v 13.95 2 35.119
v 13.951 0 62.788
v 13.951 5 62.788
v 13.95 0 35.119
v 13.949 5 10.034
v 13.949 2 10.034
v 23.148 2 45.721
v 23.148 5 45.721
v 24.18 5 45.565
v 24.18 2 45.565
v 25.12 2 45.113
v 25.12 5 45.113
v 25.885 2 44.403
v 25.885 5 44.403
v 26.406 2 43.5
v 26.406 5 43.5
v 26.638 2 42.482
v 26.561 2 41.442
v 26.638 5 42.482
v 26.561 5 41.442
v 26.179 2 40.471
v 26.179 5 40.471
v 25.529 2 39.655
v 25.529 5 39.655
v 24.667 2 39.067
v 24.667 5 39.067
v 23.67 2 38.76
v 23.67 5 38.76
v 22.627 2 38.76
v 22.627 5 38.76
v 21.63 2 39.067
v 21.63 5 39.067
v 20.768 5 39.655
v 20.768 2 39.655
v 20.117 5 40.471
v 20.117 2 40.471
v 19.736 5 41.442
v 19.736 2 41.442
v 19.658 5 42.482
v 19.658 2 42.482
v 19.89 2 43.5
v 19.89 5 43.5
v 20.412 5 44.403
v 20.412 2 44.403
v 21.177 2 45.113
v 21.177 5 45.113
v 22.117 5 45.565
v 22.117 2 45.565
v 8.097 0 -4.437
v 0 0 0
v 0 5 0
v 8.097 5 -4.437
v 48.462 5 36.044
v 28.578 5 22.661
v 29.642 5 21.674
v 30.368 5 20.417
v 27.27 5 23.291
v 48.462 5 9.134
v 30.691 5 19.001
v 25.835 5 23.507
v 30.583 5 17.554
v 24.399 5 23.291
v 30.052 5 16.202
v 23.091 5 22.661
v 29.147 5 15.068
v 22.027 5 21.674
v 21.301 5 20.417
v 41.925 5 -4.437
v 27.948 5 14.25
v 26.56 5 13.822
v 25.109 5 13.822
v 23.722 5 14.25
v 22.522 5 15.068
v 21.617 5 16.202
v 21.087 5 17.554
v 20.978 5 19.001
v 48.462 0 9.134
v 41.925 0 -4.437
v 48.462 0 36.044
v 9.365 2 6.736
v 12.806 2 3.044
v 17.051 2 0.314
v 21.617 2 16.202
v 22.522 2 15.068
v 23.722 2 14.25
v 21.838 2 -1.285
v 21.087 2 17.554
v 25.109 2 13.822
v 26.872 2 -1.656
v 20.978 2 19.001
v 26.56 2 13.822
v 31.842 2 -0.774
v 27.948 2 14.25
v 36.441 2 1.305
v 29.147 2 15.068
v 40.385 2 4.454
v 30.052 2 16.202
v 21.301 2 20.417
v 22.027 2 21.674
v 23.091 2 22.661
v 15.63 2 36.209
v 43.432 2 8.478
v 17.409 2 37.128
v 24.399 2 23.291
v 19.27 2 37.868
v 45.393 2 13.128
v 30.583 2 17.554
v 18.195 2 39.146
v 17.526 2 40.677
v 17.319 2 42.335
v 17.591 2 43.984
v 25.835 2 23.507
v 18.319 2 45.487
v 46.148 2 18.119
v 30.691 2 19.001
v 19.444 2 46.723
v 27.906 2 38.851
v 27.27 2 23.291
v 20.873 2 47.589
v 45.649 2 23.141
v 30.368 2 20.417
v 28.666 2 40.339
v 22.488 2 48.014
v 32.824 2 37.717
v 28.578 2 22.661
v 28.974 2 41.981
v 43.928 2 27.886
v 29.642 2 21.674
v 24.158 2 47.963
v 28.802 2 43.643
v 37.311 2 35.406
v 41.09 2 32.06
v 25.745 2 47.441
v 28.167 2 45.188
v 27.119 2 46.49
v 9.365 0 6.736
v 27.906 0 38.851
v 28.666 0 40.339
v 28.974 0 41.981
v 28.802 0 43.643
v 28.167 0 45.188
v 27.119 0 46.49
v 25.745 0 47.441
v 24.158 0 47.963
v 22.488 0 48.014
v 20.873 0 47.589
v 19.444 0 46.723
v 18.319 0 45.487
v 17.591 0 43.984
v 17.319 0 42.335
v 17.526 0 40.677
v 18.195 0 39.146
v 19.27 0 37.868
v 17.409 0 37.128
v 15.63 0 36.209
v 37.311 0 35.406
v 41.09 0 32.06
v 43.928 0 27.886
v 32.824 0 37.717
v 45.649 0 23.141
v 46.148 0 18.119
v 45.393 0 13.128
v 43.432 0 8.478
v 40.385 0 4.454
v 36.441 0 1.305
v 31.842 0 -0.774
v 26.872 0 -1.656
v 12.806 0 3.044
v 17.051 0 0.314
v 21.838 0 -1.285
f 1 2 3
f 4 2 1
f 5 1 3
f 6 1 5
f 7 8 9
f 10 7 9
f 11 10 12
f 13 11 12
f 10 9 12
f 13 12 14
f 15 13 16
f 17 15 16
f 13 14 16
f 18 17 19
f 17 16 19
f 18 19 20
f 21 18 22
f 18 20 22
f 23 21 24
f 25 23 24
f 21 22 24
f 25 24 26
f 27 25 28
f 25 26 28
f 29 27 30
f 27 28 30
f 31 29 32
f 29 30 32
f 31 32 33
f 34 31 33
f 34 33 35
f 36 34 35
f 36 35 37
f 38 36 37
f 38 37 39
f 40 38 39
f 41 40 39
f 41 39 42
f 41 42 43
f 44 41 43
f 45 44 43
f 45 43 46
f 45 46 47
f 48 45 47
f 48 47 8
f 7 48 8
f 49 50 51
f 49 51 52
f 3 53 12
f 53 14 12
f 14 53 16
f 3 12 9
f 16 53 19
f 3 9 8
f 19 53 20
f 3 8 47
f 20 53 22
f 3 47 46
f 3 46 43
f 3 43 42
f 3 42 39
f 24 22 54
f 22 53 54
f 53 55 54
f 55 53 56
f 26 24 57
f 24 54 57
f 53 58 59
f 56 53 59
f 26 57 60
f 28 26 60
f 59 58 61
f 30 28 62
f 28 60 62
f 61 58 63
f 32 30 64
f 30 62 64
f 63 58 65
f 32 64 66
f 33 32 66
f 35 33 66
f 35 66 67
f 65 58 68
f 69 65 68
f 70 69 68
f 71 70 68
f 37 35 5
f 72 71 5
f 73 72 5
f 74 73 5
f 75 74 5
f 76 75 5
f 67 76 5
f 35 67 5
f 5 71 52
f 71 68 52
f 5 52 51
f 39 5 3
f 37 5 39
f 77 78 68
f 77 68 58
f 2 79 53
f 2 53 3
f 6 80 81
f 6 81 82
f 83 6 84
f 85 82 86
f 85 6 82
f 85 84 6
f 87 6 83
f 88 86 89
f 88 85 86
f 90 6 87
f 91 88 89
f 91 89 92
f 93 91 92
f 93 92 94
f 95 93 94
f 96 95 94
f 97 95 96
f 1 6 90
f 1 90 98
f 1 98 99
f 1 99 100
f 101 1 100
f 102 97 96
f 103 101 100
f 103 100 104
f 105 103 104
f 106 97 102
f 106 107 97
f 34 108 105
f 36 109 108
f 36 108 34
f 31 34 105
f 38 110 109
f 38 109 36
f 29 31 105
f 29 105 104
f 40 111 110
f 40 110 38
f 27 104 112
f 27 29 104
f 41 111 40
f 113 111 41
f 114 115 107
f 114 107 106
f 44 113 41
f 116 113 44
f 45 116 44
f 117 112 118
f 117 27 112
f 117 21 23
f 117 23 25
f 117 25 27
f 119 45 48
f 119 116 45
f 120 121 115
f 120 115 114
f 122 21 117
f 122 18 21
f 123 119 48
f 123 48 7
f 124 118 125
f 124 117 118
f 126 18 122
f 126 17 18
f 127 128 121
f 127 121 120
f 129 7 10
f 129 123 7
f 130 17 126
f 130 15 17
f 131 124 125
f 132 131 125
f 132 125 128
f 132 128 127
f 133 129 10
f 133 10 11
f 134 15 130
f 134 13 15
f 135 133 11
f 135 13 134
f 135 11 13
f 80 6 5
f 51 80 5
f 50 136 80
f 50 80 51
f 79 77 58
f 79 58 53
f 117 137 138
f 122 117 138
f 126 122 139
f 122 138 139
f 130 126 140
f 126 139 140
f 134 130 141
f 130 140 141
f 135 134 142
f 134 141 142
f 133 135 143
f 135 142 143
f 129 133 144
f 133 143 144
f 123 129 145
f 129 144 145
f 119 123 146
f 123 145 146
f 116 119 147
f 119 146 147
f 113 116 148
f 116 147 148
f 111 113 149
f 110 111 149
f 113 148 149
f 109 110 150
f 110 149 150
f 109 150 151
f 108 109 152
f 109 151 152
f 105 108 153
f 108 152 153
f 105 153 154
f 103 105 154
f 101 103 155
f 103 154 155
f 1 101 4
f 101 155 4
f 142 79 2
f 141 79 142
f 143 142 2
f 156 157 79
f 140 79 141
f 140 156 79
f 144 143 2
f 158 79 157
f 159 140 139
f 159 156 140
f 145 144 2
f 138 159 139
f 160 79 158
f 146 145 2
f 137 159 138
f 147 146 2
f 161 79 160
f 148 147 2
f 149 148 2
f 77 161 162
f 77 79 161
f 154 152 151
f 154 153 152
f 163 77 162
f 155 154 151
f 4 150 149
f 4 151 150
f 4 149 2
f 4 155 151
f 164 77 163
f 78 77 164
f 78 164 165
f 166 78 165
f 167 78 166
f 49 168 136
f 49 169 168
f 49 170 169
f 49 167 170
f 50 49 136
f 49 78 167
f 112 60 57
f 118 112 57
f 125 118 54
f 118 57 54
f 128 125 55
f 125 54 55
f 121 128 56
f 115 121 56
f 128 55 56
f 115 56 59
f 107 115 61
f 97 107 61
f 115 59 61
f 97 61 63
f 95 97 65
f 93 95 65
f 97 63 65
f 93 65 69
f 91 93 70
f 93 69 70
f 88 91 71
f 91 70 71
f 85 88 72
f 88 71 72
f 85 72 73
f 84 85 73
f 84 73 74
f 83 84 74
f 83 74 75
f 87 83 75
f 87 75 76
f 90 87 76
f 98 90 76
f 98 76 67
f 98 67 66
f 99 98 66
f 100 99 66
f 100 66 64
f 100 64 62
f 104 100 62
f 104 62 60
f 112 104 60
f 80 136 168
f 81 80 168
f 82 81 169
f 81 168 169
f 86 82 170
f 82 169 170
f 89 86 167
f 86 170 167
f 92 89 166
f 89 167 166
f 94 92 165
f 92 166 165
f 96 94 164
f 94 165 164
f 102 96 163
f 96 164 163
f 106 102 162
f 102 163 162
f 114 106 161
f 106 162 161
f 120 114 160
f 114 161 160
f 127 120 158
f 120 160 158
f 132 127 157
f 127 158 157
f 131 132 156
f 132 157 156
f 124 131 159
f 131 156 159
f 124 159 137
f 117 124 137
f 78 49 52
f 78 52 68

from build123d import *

# Parameters (mm, degrees)
EXTRUDE_1_DEPTH     = 5
CUT_EXTRUDE_1_DEPTH = 2
SKETCH_3_R          = 4.87
SKETCH_3_R_2        = 3.5
CUT_EXTRUDE_2_DEPTH = 80.472580045


with BuildPart() as part:
    # Эскиз1 → Вытянуть1 (new body)
    with BuildSketch(Plane(origin=(0, 0, 0), x_dir=(1, 0, 0), z_dir=(0, 1, 0))):
        Polygon((1e-09, -1e-09), (8.096990259, 4.437064442), (41.925316116, 4.437064442), (48.461562516, -9.134468652), (48.461562516, -36.044162995), (13.950964491, -62.788278664), (13.949330464, -10.03402267), align=None)
    extrude(amount=EXTRUDE_1_DEPTH)

    # Эскиз2 → Вырез-Вытянуть1 (cut)
    with BuildSketch(Plane.XZ):
        with BuildLine():
            ThreePointArc((19.270119717, 37.867537317), (28.134312971, -1.551588069), (27.906130369, 38.851249714))
            ThreePointArc((27.906130369, 38.851249714), (22.488439096, 48.013535902), (19.270119717, 37.867537317))
        make_face()
    extrude(amount=-CUT_EXTRUDE_1_DEPTH, mode=Mode.SUBTRACT)

    # Эскиз3 → Вырез-Вытянуть2 (cut, through all)
    with BuildSketch(Plane(origin=(0, 5, 0), x_dir=(1, 0, 0), z_dir=(0, 1, 0))):
        with Locations(Location((25.834611823, -18.637487181, 0), (0, 0, 270))):
            Circle(SKETCH_3_R)
        with Locations(Location((23.148278256, -42.220808245, 0), (0, 0, 270))):
            Circle(SKETCH_3_R_2)
    extrude(amount=-CUT_EXTRUDE_2_DEPTH, mode=Mode.SUBTRACT)


solid = part.part
